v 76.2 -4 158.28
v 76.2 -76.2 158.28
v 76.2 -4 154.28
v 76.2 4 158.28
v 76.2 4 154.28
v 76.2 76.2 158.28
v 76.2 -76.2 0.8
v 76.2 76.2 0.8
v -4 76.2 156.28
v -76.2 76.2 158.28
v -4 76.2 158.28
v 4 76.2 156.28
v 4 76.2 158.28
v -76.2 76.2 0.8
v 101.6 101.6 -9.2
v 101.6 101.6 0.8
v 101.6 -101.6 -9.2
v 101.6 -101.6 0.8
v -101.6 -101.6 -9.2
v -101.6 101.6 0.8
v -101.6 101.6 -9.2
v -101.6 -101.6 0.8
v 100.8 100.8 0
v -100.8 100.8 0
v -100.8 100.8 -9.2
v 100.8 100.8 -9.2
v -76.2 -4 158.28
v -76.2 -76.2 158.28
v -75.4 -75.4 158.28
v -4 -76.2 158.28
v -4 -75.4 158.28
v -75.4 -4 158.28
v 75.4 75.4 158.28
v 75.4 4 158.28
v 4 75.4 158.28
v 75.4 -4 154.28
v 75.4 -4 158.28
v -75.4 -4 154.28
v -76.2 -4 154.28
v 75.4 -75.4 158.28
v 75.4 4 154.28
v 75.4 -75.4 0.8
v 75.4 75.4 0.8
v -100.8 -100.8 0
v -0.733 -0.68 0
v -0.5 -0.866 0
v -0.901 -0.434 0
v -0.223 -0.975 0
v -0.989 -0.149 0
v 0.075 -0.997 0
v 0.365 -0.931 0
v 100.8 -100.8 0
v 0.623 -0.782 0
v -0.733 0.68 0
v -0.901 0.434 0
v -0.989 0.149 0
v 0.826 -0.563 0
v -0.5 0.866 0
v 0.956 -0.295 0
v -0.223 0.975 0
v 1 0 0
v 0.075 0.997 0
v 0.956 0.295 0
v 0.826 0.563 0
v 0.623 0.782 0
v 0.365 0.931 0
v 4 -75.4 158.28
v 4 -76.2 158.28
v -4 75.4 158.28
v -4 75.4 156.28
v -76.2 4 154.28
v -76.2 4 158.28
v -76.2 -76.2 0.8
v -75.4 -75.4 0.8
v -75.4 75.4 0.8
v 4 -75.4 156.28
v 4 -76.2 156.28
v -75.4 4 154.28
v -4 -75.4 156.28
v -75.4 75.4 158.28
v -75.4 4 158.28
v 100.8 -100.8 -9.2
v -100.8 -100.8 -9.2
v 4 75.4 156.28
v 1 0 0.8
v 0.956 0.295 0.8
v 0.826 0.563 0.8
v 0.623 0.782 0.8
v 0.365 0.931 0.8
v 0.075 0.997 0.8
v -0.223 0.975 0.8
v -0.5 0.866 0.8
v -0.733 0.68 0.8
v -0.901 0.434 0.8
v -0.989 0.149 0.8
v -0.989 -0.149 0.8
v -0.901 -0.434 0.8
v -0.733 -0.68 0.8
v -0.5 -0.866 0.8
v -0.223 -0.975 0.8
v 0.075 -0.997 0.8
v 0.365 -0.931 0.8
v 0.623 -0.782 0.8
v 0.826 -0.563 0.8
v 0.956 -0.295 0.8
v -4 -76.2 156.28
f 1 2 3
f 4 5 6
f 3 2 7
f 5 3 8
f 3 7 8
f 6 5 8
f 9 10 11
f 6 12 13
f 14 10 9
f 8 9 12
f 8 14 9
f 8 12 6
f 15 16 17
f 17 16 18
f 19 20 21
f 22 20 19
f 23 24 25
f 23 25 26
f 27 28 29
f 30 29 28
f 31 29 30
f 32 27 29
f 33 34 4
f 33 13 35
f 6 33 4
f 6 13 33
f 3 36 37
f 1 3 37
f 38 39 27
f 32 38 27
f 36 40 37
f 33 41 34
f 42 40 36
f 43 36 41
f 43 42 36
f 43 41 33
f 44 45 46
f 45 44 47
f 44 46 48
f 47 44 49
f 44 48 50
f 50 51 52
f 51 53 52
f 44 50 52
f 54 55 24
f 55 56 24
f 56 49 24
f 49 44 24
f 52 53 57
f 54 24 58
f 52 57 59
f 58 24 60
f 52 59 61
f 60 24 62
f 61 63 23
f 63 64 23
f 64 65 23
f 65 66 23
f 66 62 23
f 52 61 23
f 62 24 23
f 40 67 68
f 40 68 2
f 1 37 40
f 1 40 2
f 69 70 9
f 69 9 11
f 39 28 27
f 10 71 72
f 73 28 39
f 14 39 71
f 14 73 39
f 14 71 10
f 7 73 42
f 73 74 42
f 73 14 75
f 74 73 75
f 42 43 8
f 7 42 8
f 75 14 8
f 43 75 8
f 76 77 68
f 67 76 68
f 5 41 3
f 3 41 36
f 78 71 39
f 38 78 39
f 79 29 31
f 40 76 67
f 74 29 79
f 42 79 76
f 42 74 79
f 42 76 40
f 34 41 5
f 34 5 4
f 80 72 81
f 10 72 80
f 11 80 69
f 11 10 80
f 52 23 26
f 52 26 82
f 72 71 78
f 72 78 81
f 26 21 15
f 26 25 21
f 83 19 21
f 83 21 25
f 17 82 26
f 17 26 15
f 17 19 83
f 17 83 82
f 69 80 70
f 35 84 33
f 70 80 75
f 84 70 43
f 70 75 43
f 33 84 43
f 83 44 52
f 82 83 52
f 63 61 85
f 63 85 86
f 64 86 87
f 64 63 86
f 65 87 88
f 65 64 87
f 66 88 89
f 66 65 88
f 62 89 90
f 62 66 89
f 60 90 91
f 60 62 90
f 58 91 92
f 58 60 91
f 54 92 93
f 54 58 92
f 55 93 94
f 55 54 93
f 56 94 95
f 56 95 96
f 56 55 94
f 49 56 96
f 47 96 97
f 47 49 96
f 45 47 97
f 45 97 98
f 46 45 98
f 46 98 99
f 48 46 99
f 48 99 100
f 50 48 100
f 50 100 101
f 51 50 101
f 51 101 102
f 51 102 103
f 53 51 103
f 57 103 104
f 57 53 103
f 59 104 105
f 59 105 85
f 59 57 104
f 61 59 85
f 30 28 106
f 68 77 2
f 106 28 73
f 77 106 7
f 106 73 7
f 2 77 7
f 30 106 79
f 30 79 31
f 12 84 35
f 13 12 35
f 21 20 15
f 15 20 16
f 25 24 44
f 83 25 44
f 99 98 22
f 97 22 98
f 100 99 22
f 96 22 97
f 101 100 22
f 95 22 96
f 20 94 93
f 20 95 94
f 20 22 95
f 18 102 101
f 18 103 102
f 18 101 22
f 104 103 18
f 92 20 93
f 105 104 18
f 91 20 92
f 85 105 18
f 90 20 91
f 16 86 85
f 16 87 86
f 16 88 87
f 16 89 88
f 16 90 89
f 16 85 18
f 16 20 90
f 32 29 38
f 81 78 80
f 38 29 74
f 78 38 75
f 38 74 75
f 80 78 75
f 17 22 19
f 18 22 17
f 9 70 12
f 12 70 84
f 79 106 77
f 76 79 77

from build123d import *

# Parameters (mm, degrees)
F0_W     = 203.2
F0_H     = 203.2
F0_R     = 1
F1_DEPTH = 0.8
F2_W     = 203.2
F2_H     = 203.2
F2_W_2   = 201.6
F2_H_2   = 201.6
F3_DEPTH = 9.2
F4_W     = 152.4
F4_H     = 152.4
F4_W_2   = 150.8
F4_H_2   = 150.8
F5_DEPTH = 157.48
F6_W     = 8
F6_H     = 2
F7_DEPTH = 177.801
F8_W     = 8
F8_H     = 4
F9_DEPTH = 177.801


with BuildPart() as f1:
    # F0 (on Top) → F1 (new body)
    with BuildSketch(Plane.XY):
        Rectangle(F0_W, F0_H)
        Circle(F0_R, mode=Mode.SUBTRACT)
    extrude(amount=F1_DEPTH)

    # F2 (on face) → F3 (join)
    with BuildSketch(Plane(origin=(0, 0, 0), x_dir=(1, 0, 0), z_dir=(0, 0, -1))):
        Rectangle(F2_W, F2_H)
        Rectangle(F2_W_2, F2_H_2, mode=Mode.SUBTRACT)
    extrude(amount=F3_DEPTH)


with BuildPart() as f5:
    # F4 (on face) → F5 (new body)
    with BuildSketch(Plane.XY.offset(0.8)):
        Rectangle(F4_W, F4_H)
        Rectangle(F4_W_2, F4_H_2, mode=Mode.SUBTRACT)
    extrude(amount=F5_DEPTH)

    # F6 (on face) → F7 (cut, through all)
    with BuildSketch(Plane.XZ.offset(76.2)):
        with Locations((0, 157.28)):
            Rectangle(F6_W, F6_H)
    extrude(amount=-F7_DEPTH, mode=Mode.SUBTRACT)

    # F8 (on face) → F9 (cut, through all)
    with BuildSketch(Plane(origin=(-76.2, 0, 0), x_dir=(0, -1, 0), z_dir=(-1, 0, 0))):
        with Locations((0, 156.28)):
            Rectangle(F8_W, F8_H)
    extrude(amount=-F9_DEPTH, mode=Mode.SUBTRACT)


solid = Compound([f1.part, f5.part])
